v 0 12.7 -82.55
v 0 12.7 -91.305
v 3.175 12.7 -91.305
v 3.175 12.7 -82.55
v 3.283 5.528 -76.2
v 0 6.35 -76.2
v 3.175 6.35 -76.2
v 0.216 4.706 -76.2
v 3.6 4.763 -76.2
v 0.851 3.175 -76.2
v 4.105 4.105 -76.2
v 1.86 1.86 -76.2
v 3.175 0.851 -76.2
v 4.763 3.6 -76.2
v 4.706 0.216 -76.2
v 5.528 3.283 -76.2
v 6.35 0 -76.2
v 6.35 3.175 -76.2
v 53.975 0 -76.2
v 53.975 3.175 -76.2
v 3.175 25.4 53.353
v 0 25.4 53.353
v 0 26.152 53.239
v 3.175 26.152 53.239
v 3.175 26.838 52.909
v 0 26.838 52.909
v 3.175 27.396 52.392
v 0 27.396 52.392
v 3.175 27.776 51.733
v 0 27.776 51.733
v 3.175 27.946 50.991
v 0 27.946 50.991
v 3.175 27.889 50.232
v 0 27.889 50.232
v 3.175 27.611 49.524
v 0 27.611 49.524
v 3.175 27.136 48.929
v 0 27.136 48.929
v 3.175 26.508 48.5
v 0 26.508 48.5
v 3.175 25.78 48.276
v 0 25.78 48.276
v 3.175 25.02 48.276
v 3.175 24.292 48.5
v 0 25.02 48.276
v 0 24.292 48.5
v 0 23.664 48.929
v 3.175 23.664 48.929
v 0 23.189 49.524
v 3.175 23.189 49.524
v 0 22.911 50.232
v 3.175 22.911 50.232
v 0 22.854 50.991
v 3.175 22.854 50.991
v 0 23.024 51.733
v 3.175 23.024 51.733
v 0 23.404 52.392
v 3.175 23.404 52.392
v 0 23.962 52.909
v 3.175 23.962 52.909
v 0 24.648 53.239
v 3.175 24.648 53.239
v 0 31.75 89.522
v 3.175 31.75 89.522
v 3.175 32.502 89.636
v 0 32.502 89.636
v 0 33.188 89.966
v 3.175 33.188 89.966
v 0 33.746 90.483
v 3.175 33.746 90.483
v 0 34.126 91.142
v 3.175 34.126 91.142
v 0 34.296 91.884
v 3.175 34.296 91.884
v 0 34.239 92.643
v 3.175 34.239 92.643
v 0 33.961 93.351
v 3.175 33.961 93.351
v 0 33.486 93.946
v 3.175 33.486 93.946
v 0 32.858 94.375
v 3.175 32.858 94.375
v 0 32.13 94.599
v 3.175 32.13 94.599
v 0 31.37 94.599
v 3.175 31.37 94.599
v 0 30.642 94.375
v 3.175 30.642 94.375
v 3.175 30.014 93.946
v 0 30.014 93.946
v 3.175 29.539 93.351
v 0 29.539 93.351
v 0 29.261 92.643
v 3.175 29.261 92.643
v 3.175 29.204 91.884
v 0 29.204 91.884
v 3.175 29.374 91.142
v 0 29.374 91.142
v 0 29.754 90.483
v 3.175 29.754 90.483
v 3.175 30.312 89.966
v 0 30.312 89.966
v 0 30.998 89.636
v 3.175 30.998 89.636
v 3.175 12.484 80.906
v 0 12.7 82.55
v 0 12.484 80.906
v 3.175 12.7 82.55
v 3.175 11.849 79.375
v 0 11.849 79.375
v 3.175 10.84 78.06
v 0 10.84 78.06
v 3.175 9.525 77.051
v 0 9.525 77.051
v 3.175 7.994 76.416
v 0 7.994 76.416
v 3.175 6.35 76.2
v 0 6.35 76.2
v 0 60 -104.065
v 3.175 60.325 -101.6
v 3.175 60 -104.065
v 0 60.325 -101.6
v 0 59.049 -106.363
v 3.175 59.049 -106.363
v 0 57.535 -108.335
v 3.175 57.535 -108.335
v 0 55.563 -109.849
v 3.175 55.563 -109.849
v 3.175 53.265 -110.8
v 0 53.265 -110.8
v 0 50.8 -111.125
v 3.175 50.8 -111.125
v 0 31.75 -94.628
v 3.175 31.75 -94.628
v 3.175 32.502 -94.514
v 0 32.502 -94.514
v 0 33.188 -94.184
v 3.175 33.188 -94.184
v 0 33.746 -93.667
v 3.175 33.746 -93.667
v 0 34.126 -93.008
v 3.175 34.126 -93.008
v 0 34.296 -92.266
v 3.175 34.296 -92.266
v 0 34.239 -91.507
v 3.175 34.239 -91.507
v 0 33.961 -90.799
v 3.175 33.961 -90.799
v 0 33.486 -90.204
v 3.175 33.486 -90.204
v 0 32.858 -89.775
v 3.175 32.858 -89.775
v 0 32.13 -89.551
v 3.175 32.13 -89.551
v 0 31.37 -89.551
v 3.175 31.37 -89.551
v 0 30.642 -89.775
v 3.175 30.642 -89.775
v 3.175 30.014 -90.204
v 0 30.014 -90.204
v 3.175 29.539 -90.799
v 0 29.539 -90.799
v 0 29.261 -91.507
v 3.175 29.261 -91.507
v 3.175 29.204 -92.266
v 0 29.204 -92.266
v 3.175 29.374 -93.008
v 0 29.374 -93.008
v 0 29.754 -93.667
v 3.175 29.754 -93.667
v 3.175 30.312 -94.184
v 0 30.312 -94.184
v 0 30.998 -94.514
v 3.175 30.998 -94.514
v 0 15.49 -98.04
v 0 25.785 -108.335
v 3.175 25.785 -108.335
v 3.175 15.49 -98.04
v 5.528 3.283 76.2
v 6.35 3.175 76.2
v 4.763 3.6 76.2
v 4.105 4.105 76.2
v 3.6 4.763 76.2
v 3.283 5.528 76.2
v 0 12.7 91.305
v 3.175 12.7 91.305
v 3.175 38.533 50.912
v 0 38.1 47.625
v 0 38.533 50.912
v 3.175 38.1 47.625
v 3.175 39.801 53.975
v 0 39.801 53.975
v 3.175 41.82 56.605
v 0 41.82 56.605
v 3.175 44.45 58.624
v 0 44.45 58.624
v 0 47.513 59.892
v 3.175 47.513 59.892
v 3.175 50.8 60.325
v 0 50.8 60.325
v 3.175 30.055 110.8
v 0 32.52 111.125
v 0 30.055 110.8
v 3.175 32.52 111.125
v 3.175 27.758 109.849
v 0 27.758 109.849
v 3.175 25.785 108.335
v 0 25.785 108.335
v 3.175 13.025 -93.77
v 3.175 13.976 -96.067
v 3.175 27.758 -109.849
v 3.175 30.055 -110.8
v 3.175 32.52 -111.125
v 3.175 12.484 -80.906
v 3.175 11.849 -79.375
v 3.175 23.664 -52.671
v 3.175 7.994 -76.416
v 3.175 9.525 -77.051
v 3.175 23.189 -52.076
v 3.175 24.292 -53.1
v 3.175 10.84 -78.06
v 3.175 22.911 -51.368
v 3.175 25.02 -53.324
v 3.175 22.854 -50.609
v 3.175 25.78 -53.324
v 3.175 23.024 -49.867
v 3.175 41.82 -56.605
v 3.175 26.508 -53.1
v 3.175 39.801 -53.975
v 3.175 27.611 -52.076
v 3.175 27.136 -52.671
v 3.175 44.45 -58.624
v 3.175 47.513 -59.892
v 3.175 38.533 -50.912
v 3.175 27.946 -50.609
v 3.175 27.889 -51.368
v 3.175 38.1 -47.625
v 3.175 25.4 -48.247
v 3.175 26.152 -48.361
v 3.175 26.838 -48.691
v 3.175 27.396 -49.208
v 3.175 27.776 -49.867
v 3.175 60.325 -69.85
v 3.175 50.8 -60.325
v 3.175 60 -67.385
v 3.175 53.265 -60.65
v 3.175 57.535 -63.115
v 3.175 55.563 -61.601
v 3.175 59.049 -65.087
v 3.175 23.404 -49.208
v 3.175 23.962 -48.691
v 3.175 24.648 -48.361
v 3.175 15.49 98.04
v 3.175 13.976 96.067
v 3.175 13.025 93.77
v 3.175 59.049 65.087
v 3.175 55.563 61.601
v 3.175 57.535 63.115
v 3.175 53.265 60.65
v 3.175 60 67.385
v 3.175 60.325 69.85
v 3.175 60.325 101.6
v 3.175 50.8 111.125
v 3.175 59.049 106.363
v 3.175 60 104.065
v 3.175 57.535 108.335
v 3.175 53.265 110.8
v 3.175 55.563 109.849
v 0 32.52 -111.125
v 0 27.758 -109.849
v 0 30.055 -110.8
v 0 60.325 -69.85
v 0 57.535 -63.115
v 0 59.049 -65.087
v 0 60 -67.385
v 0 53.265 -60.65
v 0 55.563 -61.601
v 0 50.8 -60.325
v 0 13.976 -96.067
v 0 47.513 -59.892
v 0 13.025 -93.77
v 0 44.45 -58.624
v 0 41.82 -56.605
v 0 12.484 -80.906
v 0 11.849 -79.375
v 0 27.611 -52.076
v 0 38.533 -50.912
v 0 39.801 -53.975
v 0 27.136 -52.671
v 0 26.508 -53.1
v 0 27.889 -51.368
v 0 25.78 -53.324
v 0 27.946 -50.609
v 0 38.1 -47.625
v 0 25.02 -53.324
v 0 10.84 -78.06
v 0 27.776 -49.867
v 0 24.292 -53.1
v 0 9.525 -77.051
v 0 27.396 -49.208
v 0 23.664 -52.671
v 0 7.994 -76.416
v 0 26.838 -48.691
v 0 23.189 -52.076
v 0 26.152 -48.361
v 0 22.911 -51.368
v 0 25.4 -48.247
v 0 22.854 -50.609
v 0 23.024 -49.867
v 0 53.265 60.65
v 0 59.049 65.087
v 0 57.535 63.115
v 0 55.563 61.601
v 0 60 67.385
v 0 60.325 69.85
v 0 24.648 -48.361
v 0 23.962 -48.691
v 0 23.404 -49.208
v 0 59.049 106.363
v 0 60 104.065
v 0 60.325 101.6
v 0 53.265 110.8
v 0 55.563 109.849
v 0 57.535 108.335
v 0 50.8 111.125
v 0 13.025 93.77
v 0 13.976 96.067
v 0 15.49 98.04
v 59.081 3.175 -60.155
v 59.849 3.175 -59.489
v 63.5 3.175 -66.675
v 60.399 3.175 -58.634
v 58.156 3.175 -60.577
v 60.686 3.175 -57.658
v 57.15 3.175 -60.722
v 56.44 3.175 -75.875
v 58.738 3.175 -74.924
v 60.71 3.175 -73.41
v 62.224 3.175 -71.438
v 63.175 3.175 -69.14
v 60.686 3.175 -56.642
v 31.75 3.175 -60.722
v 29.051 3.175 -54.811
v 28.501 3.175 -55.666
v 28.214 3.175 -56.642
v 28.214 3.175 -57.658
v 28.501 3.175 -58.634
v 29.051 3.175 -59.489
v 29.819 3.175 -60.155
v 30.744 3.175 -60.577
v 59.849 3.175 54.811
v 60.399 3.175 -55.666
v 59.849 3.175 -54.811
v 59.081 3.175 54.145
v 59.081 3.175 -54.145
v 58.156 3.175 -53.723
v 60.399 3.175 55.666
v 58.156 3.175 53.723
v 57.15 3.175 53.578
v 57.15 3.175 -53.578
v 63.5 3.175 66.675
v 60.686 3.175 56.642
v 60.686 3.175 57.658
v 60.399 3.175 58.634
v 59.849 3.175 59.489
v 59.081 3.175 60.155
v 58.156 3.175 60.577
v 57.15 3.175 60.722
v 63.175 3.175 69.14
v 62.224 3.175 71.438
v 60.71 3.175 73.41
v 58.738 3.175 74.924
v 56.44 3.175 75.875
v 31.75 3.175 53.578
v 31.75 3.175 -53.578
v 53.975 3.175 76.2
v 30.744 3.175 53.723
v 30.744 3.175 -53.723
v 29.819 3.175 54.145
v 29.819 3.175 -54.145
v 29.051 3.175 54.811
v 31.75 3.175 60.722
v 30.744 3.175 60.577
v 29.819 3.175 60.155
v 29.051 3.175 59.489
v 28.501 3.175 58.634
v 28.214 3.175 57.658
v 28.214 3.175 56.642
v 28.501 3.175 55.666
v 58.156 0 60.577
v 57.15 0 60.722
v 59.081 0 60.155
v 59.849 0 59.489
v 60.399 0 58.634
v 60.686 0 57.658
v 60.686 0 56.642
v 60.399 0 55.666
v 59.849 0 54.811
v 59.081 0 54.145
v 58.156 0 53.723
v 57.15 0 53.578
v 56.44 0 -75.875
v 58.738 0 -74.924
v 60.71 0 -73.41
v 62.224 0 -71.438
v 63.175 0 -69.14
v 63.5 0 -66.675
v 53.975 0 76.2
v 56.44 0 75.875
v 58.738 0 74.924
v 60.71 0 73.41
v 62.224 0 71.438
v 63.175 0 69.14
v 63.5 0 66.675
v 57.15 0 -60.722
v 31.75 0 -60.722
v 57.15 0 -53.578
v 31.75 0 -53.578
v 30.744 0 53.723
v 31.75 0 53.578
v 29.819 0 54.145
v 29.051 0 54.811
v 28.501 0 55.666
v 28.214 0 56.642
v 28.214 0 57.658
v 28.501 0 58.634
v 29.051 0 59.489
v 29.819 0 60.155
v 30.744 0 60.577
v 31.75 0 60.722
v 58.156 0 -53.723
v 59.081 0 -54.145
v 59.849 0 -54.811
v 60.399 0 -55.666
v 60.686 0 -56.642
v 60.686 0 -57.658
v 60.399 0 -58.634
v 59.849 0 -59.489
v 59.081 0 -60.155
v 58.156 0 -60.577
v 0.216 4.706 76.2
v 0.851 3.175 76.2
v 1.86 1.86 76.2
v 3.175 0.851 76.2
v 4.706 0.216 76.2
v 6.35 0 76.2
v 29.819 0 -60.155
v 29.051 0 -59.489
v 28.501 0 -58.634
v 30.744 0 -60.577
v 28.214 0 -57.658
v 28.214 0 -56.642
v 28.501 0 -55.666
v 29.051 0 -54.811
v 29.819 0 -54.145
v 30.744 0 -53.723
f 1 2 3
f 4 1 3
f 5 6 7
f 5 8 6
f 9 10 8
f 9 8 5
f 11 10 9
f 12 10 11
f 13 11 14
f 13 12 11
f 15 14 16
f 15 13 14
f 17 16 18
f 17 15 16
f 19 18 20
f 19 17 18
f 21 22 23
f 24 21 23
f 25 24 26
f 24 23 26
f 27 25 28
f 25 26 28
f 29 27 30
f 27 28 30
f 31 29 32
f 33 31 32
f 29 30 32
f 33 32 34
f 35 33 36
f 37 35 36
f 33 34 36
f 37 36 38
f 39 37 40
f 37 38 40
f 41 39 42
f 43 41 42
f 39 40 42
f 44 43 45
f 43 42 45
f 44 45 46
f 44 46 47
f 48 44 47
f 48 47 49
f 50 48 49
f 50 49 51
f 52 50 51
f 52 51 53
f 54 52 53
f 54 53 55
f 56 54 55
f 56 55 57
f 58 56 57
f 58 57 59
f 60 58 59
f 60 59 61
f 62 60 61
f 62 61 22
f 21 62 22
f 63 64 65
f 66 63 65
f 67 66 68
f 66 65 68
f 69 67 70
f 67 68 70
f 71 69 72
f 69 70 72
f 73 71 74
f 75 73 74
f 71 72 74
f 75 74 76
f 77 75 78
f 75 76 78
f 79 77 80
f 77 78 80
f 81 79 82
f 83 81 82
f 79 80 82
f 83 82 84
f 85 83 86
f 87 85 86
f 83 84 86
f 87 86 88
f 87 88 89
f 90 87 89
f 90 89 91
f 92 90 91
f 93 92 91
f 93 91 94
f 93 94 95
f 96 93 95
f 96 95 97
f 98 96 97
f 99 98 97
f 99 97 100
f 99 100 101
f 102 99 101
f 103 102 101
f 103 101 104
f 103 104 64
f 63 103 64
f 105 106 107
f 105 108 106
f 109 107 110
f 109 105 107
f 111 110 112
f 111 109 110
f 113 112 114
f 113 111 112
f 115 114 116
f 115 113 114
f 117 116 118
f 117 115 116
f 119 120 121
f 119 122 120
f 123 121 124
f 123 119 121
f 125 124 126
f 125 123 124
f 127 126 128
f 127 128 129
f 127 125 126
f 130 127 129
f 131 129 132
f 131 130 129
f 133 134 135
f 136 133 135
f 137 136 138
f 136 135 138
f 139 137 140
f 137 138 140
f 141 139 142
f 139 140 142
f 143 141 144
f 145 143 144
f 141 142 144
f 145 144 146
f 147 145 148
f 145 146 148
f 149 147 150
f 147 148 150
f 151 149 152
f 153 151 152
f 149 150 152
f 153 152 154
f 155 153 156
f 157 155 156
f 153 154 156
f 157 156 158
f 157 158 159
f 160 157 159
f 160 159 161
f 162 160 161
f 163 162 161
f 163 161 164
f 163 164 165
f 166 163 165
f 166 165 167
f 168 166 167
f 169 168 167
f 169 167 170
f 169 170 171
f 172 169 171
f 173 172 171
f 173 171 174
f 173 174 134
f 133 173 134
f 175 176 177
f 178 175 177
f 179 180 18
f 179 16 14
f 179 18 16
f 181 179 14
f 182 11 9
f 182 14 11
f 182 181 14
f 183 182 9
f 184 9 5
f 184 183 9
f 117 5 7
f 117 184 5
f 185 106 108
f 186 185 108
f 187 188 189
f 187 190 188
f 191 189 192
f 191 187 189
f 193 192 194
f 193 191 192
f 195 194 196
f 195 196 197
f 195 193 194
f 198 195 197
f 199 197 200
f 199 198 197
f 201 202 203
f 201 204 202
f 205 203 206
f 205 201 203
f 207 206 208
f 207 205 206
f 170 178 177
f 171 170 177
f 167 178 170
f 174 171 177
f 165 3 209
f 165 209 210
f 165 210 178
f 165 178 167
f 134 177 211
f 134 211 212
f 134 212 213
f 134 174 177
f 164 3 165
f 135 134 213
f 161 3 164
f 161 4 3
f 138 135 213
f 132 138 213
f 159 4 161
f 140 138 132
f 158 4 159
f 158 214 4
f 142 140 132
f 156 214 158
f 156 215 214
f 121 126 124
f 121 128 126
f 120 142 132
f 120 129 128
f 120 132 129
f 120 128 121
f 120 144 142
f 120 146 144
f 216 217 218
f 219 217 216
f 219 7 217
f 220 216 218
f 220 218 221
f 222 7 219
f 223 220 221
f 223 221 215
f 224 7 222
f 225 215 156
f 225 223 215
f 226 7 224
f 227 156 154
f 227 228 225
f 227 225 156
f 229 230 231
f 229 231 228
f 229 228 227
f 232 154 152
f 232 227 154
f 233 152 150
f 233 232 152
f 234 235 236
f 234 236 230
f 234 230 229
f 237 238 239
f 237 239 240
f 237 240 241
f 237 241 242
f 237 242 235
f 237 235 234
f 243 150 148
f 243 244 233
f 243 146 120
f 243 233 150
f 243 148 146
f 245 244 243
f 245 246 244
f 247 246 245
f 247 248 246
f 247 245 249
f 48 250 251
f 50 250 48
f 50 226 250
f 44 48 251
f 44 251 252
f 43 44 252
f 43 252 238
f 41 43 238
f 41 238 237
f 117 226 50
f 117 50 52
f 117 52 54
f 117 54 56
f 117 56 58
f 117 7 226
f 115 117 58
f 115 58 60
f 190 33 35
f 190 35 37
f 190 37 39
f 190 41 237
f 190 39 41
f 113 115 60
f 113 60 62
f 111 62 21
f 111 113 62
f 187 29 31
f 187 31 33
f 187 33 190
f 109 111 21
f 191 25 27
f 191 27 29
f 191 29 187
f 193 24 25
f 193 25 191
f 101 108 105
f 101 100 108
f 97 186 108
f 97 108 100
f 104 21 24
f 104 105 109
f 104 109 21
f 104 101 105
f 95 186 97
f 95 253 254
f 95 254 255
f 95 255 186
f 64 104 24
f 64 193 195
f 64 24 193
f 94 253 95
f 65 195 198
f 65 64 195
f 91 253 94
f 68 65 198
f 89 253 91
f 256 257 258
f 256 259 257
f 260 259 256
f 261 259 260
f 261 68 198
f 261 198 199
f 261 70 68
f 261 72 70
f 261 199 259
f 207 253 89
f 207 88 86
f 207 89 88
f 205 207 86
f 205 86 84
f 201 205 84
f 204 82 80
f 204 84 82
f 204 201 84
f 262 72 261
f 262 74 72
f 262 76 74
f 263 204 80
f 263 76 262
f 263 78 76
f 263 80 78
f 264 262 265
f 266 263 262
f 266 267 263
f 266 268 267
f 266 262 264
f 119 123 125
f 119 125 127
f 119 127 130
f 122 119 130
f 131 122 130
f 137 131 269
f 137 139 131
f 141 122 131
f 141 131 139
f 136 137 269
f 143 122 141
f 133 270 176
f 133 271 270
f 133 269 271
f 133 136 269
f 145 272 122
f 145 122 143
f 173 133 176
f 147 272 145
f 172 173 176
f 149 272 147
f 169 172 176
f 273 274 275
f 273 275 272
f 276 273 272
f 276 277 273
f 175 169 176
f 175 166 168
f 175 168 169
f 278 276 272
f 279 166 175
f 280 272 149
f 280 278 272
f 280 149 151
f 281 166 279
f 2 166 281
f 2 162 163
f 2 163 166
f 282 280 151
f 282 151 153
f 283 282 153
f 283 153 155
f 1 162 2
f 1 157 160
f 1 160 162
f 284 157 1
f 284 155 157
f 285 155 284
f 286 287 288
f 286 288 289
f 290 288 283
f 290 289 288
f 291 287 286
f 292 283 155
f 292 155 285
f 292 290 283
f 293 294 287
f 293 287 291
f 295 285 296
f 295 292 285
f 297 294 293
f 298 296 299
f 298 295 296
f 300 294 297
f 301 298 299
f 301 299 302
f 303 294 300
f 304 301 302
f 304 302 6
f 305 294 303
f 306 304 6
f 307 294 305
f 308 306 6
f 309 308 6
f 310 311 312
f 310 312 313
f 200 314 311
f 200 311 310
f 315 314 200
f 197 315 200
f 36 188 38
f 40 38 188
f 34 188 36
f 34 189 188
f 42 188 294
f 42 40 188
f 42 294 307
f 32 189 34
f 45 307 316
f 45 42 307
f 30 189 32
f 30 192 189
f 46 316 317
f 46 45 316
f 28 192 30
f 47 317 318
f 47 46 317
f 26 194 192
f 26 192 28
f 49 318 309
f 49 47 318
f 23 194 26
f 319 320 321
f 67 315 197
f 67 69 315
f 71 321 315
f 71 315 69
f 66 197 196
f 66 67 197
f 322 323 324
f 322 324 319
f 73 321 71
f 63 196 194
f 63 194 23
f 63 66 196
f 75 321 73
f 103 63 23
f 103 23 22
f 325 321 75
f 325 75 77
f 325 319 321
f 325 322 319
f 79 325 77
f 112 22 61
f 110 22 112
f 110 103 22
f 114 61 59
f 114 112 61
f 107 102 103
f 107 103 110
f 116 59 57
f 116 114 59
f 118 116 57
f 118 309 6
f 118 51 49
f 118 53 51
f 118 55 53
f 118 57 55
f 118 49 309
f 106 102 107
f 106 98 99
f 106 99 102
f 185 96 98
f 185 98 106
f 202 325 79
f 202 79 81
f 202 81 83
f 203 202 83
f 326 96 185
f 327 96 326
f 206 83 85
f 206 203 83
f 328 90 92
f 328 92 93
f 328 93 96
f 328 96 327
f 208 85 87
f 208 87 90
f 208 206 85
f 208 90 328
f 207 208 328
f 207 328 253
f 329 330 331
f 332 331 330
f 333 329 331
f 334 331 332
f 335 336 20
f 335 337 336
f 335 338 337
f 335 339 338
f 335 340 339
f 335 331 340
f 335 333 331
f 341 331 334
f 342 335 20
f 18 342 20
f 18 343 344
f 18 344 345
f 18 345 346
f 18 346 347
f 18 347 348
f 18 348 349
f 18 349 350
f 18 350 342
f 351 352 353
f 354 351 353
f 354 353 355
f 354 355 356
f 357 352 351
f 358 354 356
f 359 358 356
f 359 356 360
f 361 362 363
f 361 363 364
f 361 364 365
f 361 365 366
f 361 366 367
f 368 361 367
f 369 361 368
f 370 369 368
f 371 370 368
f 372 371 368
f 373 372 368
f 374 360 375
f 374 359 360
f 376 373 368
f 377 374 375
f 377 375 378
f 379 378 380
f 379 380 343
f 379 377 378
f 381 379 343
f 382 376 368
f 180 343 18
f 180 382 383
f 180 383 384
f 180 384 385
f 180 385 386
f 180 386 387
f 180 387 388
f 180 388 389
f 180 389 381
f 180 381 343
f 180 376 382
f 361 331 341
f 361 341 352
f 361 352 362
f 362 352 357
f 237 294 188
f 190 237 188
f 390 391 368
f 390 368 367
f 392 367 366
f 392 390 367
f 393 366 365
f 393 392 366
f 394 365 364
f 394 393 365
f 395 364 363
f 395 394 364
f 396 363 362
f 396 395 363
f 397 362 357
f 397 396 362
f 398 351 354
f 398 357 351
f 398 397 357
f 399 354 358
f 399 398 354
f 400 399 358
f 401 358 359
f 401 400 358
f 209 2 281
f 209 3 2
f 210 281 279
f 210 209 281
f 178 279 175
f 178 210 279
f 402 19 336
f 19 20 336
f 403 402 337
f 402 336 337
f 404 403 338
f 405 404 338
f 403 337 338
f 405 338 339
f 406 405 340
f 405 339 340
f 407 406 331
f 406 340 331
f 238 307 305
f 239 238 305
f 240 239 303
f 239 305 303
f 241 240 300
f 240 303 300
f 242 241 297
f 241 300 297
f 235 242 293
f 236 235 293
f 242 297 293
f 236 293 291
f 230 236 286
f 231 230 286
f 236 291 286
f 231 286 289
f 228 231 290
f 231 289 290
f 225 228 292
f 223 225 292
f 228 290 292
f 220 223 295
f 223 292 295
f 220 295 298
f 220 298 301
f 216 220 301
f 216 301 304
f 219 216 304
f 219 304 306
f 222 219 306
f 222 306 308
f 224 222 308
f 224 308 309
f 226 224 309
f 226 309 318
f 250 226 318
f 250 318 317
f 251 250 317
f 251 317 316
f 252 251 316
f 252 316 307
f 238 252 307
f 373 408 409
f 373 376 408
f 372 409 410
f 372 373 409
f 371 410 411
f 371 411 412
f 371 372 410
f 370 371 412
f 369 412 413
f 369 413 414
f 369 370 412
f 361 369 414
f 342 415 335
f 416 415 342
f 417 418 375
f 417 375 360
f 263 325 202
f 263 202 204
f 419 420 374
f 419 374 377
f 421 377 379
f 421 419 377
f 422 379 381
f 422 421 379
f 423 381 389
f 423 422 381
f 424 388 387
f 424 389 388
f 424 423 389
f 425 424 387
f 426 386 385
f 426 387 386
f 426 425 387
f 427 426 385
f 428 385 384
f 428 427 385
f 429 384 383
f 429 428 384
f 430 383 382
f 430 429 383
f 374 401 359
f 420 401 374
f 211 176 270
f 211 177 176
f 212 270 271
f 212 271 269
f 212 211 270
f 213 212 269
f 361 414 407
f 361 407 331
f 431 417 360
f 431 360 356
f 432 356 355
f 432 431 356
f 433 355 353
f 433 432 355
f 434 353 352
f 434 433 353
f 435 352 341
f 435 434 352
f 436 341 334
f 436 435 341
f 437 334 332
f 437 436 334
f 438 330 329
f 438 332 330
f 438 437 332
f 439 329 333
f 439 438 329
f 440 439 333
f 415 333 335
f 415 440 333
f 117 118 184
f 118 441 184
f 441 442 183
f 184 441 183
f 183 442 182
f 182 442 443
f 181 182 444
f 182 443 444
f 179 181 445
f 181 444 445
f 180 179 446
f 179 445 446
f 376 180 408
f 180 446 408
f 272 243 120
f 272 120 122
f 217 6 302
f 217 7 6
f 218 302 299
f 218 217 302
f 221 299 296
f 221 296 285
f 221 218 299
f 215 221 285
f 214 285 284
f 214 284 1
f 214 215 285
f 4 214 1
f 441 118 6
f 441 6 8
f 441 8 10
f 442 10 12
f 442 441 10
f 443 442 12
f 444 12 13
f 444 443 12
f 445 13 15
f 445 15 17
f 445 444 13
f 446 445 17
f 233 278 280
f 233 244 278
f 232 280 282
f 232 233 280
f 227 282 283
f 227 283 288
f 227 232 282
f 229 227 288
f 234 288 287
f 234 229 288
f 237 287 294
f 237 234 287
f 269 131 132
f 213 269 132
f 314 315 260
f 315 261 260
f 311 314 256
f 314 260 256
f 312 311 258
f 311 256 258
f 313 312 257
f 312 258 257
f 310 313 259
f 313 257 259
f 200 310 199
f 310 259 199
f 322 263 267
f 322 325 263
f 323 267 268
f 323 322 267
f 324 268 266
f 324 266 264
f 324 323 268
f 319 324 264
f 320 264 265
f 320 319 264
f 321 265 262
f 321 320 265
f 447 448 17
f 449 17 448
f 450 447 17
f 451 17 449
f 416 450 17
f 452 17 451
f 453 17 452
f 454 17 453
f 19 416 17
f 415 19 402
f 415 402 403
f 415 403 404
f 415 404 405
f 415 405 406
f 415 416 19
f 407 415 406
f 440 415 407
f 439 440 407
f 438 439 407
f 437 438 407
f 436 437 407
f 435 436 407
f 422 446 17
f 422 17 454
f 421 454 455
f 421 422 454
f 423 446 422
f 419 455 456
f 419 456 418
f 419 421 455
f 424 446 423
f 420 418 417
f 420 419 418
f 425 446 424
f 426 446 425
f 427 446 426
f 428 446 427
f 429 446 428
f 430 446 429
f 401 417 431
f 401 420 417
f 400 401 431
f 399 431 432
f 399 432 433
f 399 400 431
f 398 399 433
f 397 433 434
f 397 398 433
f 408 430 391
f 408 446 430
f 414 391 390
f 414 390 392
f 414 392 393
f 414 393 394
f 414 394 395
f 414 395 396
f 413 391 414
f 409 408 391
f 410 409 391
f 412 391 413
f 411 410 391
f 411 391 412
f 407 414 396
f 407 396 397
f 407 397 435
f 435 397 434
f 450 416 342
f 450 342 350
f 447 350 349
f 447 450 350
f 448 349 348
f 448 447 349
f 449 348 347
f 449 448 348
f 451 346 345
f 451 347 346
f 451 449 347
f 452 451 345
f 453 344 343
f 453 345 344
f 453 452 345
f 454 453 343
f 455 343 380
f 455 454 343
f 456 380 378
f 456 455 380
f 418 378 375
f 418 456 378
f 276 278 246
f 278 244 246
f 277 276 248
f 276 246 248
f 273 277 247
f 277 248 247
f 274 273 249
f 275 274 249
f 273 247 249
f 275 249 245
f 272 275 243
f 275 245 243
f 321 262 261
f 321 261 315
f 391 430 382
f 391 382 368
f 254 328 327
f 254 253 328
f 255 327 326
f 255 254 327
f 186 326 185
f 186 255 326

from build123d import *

# Parameters (mm, degrees)
BASE_FLANGE1_DEPTH          = 111.125
CUT_EXTRUDE1_REACH          = 143.492
F_1_4_20_TAPPED_HOLE1_D     = 5.1054
EXTRUDE1_REACH              = 143.492
SKETCH5_W                   = 120.65
SKETCH5_H                   = 22.225
FILLET2_R                   = 12.7
F_1_4_20_TAPPED_HOLE2_D     = 5.1054
F_1_4_20_TAPPED_HOLE2_DEPTH = 16.51
F_1_4_20_TAPPED_HOLE2_TIP   = 1.533816902
SKETCH8_W                   = 63.5
SKETCH8_H                   = 34.925
CUT_EXTRUDE2_DEPTH          = 12.7
CHAMFER1_SIZE               = 15.875
FILLET3_R                   = 9.525
FILLET4_R                   = 9.525
FILLET5_R                   = 6.35


# Sheet-metal steps are written as plain solids
with BuildPart() as part:
    # Sketch1 → Base-Flange1 (new, symmetric)
    with BuildSketch(Plane.XY):
        with BuildLine():
            Line((0, 60.325), (0, 6.35))
            ThreePointArc((0, 6.35), (1.859871939, 1.859871939), (6.35, 0))
            Line((6.35, 0), (63.5, 0))
            Line((63.5, 0), (63.5, 3.175))
            Line((63.5, 3.175), (6.35, 3.175))
            ThreePointArc((6.35, 3.175), (4.10493597, 4.10493597), (3.175, 6.35))
            Line((3.175, 6.35), (3.175, 60.325))
            Line((3.175, 60.325), (0, 60.325))
        make_face()
    extrude(amount=BASE_FLANGE1_DEPTH, both=True)

    # Sketch2 → Cut-Extrude1 (cut, up to next)
    with BuildSketch(Plane.XZ, mode=Mode.PRIVATE) as cut_extrude1_sk1:
        with BuildLine():
            Line((31.75, 60.721875), (57.15, 60.721875))
            ThreePointArc((57.15, 60.721875), (60.721875, 57.15), (57.15, 53.578125))
            Line((57.15, 53.578125), (31.75, 53.578125))
            ThreePointArc((31.75, 53.578125), (28.178125, 57.15), (31.75, 60.721875))
        make_face()
    cut_extrude1_tool1 = extrude(cut_extrude1_sk1.sketch, amount=-CUT_EXTRUDE1_REACH, mode=Mode.PRIVATE) & part.part
    # Sketch2 → Cut-Extrude1 (cut, up to next)
    with BuildSketch(Plane.XZ, mode=Mode.PRIVATE) as cut_extrude1_sk2:
        with BuildLine():
            Line((31.75, -53.578125), (57.15, -53.578125))
            ThreePointArc((57.15, -53.578125), (60.721875, -57.15), (57.15, -60.721875))
            Line((57.15, -60.721875), (31.75, -60.721875))
            ThreePointArc((31.75, -60.721875), (28.178125, -57.15), (31.75, -53.578125))
        make_face()
    cut_extrude1_tool2 = extrude(cut_extrude1_sk2.sketch, amount=-CUT_EXTRUDE1_REACH, mode=Mode.PRIVATE) & part.part
    add(cut_extrude1_tool1.solids().sort_by_distance((44.45, 0, 57.15))[0], mode=Mode.SUBTRACT)
    add(cut_extrude1_tool2.solids().sort_by_distance((44.45, 0, -57.15))[0], mode=Mode.SUBTRACT)

    # 1/4-20 Tapped Hole1 (through all)
    with Locations(Plane.ZY):
        with Locations((-92.075, 31.75), (92.075, 31.75)):
            Hole(F_1_4_20_TAPPED_HOLE1_D / 2)

    # Sketch5 → Extrude1 (cut, up to next)
    with BuildSketch(Plane.ZY, mode=Mode.PRIVATE) as extrude1_sk1:
        with Locations((0, 49.2125)):
            Rectangle(SKETCH5_W, SKETCH5_H)
    extrude1_tool1 = extrude(extrude1_sk1.sketch, amount=-EXTRUDE1_REACH, mode=Mode.PRIVATE) & part.part
    add(extrude1_tool1.solids().sort_by_distance((0, 49.2125, 0))[0], mode=Mode.SUBTRACT)

    # Fillet2
    fillet2_edges = [part.edges().sort_by_distance(p)[0] for p in [
        (1.5875, 38.1, -60.325),
        (1.5875, 38.1, 60.325),
    ]]
    fillet(fillet2_edges, radius=FILLET2_R)

    # 1/4-20 Tapped Hole2
    with Locations(Plane(origin=(3.175, 0, 0), x_dir=(0, 0, -1), z_dir=(1, 0, 0))):
        with Locations((-50.8, 25.4), (50.8, 25.4)):
            Hole(F_1_4_20_TAPPED_HOLE2_D / 2, depth=F_1_4_20_TAPPED_HOLE2_DEPTH)
            with Locations((0, 0, -(F_1_4_20_TAPPED_HOLE2_DEPTH + F_1_4_20_TAPPED_HOLE2_TIP / 2))):  # 118° drill point
                Cone(0, F_1_4_20_TAPPED_HOLE2_D / 2, F_1_4_20_TAPPED_HOLE2_TIP, mode=Mode.SUBTRACT)

    # Sketch8 → Cut-Extrude2 (cut)
    with BuildSketch(Plane.XZ):
        with Locations((31.75, 93.6625)):
            Rectangle(SKETCH8_W, SKETCH8_H)
        with Locations((31.75, -93.6625)):
            Rectangle(SKETCH8_W, SKETCH8_H)
    extrude(amount=-CUT_EXTRUDE2_DEPTH, mode=Mode.SUBTRACT)

    # Chamfer1
    chamfer1_edges = [part.edges().sort_by_distance(p)[0] for p in [
        (1.5875, 12.7, 111.125),
        (1.5875, 12.7, -111.125),
    ]]
    chamfer(chamfer1_edges, length=CHAMFER1_SIZE)

    # Fillet3
    fillet3_edges = [part.edges().sort_by_distance(p)[0] for p in [
        (1.5875, 60.325, -111.125),
        (1.5875, 60.325, -60.325),
        (1.5875, 60.325, 60.325),
        (1.5875, 60.325, 111.125),
        (63.5, 1.5875, -76.2),
        (63.5, 1.5875, 76.2),
    ]]
    fillet(fillet3_edges, radius=FILLET3_R - 0.0001)  # a hair under: the kernel refuses the full size

    # Fillet4
    fillet4_edges = [part.edges().sort_by_distance(p)[0] for p in [
        (1.5875, 12.7, 95.25),
        (1.5875, 28.575, 111.125),
        (1.5875, 12.7, -95.25),
        (1.5875, 28.575, -111.125),
    ]]
    fillet(fillet4_edges, radius=FILLET4_R)

    # Fillet5
    fillet5_edges = [part.edges().sort_by_distance(p)[0] for p in [
        (1.5875, 12.7, -76.2),
        (1.5875, 12.7, 76.2),
    ]]
    fillet(fillet5_edges, radius=FILLET5_R)


solid = part.part
